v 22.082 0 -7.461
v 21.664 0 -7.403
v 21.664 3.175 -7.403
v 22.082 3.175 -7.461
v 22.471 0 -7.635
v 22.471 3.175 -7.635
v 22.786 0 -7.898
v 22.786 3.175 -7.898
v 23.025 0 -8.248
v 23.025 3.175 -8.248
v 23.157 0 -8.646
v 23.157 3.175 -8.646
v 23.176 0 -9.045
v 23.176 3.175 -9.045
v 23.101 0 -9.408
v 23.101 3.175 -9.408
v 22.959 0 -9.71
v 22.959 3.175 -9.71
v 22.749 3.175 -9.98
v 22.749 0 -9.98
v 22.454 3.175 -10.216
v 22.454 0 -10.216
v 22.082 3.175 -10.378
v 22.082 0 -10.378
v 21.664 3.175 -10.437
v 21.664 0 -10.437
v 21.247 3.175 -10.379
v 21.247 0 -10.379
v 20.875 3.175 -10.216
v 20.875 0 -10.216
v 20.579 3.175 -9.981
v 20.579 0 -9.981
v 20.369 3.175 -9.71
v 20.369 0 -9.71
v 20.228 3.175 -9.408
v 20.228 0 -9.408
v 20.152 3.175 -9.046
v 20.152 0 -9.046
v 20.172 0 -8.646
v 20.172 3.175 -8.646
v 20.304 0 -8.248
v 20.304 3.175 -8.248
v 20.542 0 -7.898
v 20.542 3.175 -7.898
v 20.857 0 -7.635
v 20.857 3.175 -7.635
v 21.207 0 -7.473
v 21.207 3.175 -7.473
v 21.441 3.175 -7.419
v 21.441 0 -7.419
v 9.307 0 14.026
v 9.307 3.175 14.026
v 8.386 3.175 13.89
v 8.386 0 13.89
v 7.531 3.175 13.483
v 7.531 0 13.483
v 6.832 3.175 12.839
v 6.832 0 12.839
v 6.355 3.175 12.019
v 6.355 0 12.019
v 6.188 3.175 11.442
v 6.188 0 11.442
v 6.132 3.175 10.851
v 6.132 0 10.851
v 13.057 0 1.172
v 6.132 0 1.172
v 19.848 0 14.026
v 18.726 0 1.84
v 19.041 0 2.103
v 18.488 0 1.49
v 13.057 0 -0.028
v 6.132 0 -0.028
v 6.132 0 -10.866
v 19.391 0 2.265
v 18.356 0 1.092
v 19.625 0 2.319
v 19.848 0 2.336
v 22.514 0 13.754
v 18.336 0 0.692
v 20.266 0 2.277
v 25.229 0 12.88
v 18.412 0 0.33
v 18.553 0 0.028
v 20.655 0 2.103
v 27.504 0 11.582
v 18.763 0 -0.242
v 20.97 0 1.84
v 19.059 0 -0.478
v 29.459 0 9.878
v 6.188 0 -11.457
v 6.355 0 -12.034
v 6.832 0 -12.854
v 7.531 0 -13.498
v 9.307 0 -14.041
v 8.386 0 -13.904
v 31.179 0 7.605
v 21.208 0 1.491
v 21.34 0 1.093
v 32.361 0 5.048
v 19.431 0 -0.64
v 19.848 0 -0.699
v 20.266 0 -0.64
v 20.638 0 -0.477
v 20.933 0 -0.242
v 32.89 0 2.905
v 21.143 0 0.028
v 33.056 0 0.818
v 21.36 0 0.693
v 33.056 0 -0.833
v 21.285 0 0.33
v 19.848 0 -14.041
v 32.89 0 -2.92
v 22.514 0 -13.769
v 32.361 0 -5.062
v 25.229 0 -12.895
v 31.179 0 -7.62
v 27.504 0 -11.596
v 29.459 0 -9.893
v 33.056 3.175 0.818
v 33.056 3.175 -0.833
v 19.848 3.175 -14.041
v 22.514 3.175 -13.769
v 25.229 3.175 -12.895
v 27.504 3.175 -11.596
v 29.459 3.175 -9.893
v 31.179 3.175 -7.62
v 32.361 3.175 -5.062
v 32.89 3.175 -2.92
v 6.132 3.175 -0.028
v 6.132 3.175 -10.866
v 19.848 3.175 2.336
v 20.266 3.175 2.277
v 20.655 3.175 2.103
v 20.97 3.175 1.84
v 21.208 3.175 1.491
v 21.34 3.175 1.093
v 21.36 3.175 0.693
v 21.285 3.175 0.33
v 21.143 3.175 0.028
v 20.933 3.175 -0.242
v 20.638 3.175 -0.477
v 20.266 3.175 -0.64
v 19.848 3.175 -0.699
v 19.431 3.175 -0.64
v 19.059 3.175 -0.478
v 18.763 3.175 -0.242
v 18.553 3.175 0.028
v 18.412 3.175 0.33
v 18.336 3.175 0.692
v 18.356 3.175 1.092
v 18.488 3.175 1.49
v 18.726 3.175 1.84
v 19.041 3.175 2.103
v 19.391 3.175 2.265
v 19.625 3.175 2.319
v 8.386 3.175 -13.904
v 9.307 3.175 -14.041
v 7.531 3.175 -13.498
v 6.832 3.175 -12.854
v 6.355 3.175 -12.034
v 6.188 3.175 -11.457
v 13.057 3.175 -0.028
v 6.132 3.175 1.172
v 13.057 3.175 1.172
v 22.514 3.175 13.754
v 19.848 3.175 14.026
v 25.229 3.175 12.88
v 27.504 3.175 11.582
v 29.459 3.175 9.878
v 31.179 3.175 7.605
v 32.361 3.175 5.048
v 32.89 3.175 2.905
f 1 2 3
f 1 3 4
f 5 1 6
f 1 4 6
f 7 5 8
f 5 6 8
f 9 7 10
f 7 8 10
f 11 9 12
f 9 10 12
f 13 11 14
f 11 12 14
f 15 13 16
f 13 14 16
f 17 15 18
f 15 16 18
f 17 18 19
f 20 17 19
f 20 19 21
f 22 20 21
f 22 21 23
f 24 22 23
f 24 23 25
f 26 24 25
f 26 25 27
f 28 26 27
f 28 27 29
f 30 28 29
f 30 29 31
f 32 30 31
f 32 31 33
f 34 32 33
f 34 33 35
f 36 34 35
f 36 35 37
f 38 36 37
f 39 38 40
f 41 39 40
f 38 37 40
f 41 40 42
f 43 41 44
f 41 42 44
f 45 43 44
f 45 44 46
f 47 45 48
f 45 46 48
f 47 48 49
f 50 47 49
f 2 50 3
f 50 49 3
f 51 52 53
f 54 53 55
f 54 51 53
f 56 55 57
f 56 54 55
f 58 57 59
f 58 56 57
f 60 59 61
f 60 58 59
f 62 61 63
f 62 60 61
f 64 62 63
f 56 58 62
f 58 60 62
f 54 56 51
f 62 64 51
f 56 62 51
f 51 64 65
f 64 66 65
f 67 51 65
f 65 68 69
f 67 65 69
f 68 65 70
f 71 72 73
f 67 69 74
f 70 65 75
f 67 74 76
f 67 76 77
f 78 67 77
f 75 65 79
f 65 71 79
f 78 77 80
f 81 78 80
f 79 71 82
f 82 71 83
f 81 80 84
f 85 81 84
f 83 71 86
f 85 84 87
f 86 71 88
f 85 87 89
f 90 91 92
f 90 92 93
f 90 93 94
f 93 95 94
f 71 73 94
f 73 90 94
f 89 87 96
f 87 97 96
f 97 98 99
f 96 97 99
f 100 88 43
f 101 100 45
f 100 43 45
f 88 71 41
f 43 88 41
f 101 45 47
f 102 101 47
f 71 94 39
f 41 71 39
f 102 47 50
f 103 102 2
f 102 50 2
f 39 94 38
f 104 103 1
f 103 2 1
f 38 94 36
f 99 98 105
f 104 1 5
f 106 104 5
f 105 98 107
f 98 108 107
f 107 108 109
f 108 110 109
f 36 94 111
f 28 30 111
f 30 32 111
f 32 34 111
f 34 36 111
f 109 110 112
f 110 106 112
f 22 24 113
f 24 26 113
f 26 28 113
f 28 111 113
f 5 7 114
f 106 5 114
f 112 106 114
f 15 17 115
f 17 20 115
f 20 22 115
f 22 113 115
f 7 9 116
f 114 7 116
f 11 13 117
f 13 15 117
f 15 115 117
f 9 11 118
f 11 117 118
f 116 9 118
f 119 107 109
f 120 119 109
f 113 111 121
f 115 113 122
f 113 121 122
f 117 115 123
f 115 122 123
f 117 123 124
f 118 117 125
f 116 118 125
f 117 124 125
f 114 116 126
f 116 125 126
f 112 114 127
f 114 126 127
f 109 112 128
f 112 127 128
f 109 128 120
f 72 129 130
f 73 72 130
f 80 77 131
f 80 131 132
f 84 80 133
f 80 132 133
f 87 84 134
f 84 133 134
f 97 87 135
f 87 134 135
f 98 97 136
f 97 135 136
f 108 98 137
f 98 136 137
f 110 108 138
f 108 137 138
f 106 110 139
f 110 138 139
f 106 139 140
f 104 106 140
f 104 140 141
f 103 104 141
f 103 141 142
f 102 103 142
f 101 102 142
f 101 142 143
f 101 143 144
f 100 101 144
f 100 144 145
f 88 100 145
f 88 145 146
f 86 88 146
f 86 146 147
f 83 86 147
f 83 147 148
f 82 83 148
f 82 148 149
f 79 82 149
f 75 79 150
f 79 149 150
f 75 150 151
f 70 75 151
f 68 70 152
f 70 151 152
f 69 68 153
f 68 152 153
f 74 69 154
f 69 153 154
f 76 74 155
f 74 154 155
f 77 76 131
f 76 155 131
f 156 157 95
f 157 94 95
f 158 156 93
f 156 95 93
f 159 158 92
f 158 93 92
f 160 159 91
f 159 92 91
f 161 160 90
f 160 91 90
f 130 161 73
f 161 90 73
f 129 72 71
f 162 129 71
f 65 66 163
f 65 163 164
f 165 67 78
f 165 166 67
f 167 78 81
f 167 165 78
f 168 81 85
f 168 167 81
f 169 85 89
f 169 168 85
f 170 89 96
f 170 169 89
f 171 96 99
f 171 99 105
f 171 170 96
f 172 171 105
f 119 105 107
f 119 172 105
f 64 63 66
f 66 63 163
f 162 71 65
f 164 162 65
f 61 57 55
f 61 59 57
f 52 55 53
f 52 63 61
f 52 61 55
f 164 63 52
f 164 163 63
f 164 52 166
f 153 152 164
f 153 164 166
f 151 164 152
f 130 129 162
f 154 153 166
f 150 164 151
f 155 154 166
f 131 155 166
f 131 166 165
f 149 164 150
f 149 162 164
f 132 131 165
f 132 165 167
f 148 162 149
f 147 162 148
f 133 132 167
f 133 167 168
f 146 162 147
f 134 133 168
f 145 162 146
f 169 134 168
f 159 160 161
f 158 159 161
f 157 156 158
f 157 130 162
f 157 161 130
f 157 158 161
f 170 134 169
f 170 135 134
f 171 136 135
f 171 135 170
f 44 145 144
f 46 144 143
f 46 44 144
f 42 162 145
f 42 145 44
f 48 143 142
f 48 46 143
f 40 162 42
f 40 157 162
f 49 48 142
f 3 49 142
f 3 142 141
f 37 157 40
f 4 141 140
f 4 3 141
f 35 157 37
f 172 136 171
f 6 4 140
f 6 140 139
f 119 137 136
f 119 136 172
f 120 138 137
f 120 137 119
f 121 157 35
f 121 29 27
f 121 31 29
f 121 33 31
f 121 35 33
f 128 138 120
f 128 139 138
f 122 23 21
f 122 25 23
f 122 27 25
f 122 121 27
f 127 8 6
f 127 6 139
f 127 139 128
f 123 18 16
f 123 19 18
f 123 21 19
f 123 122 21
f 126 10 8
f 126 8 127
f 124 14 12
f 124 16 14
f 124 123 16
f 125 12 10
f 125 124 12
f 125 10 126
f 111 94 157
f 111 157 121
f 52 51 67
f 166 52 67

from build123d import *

# Parameters (mm, degrees)
SKETCH1_W           = 50.8
SKETCH1_H           = 21.59
BOSS_EXTRUDE1_DEPTH = 3.175
FILLET1_R           = 10.16
SKETCH3_R           = 1.16713
CUT_EXTRUDE1_DEPTH  = 28.780796425
FILLET3_R           = 10.16
SCALE1_SCALE_X      = 1.3
SCALE1_SCALE_Y      = 1
SCALE1_SCALE_Z      = 1.3
SKETCH4_W           = 39.116
SKETCH4_H           = 28.067
CUT_EXTRUDE2_DEPTH  = 37.054605389
FILLET4_R           = 3.175
SKETCH7_W           = 6.925112
SKETCH7_H           = 1.2
CUT_EXTRUDE3_DEPTH  = 37.054605389


with BuildPart() as part:
    # Sketch1 → Boss-Extrude1 (new body)
    with BuildSketch(Plane(origin=(0, 0, 0), x_dir=(1, 0, 0), z_dir=(0, 1, 0))):
        Rectangle(SKETCH1_W, SKETCH1_H)
    extrude(amount=BOSS_EXTRUDE1_DEPTH)

    # Fillet1
    fillet1_edges = [part.edges().sort_by_distance(p)[0] for p in [
        (25.4, 1.5875, 10.795),
        (-25.4, 1.5875, 10.795),
    ]]
    fillet(fillet1_edges, radius=FILLET1_R)

    # Sketch3 → Cut-Extrude1 (cut, through all)
    with BuildSketch(Plane(origin=(0, 3.175, 0), x_dir=(1, 0, 0), z_dir=(0, 1, 0))):
        with Locations(Location((15.24, -0.635, 0), (0, 0, 270))):
            Circle(SKETCH3_R)
        with Locations(Location((16.637, 6.855847148, 0), (0, 0, 270))):
            Circle(SKETCH3_R)
        with Locations(Location((-3.81, -0.635, 0), (0, 0, 270))):
            Circle(SKETCH3_R)
    extrude(amount=-CUT_EXTRUDE1_DEPTH, mode=Mode.SUBTRACT)

    # Fillet3
    fillet3_edges = [part.edges().sort_by_distance(p)[0] for p in [
        (-25.4, 1.5875, -10.795),
        (25.4, 1.5875, -10.795),
    ]]
    fillet(fillet3_edges, radius=FILLET3_R)


with BuildPart() as part_1:
    # Scale1: scaled about (-0.120675705, 1.5875, 0.024016676)
    add(part.part.scale((SCALE1_SCALE_X, SCALE1_SCALE_Y, SCALE1_SCALE_Z), about=(-0.120675705, 1.5875, 0.024016676)))

    # Sketch4 → Cut-Extrude2 (cut, through all)
    with BuildSketch(Plane(origin=(0, 3.175, 0), x_dir=(1, 0, 0), z_dir=(0, 1, 0))):
        with Locations((-13.425797288, 0.007205003)):
            Rectangle(SKETCH4_W, SKETCH4_H)
    extrude(amount=-CUT_EXTRUDE2_DEPTH, mode=Mode.SUBTRACT)

    # Fillet4
    fillet4_edges = [part_1.edges().sort_by_distance(p)[0] for p in [
        (6.132202712, 1.5875, -14.040705003),
        (6.132202712, 1.5875, 14.026294997),
    ]]
    fillet(fillet4_edges, radius=FILLET4_R)

    # Sketch7 → Cut-Extrude3 (cut, through all)
    with BuildSketch(Plane.XZ):
        with Locations((9.594758712, 0.571779506)):
            Rectangle(SKETCH7_W, SKETCH7_H)
    extrude(amount=-CUT_EXTRUDE3_DEPTH, mode=Mode.SUBTRACT)


solid = part_1.part
